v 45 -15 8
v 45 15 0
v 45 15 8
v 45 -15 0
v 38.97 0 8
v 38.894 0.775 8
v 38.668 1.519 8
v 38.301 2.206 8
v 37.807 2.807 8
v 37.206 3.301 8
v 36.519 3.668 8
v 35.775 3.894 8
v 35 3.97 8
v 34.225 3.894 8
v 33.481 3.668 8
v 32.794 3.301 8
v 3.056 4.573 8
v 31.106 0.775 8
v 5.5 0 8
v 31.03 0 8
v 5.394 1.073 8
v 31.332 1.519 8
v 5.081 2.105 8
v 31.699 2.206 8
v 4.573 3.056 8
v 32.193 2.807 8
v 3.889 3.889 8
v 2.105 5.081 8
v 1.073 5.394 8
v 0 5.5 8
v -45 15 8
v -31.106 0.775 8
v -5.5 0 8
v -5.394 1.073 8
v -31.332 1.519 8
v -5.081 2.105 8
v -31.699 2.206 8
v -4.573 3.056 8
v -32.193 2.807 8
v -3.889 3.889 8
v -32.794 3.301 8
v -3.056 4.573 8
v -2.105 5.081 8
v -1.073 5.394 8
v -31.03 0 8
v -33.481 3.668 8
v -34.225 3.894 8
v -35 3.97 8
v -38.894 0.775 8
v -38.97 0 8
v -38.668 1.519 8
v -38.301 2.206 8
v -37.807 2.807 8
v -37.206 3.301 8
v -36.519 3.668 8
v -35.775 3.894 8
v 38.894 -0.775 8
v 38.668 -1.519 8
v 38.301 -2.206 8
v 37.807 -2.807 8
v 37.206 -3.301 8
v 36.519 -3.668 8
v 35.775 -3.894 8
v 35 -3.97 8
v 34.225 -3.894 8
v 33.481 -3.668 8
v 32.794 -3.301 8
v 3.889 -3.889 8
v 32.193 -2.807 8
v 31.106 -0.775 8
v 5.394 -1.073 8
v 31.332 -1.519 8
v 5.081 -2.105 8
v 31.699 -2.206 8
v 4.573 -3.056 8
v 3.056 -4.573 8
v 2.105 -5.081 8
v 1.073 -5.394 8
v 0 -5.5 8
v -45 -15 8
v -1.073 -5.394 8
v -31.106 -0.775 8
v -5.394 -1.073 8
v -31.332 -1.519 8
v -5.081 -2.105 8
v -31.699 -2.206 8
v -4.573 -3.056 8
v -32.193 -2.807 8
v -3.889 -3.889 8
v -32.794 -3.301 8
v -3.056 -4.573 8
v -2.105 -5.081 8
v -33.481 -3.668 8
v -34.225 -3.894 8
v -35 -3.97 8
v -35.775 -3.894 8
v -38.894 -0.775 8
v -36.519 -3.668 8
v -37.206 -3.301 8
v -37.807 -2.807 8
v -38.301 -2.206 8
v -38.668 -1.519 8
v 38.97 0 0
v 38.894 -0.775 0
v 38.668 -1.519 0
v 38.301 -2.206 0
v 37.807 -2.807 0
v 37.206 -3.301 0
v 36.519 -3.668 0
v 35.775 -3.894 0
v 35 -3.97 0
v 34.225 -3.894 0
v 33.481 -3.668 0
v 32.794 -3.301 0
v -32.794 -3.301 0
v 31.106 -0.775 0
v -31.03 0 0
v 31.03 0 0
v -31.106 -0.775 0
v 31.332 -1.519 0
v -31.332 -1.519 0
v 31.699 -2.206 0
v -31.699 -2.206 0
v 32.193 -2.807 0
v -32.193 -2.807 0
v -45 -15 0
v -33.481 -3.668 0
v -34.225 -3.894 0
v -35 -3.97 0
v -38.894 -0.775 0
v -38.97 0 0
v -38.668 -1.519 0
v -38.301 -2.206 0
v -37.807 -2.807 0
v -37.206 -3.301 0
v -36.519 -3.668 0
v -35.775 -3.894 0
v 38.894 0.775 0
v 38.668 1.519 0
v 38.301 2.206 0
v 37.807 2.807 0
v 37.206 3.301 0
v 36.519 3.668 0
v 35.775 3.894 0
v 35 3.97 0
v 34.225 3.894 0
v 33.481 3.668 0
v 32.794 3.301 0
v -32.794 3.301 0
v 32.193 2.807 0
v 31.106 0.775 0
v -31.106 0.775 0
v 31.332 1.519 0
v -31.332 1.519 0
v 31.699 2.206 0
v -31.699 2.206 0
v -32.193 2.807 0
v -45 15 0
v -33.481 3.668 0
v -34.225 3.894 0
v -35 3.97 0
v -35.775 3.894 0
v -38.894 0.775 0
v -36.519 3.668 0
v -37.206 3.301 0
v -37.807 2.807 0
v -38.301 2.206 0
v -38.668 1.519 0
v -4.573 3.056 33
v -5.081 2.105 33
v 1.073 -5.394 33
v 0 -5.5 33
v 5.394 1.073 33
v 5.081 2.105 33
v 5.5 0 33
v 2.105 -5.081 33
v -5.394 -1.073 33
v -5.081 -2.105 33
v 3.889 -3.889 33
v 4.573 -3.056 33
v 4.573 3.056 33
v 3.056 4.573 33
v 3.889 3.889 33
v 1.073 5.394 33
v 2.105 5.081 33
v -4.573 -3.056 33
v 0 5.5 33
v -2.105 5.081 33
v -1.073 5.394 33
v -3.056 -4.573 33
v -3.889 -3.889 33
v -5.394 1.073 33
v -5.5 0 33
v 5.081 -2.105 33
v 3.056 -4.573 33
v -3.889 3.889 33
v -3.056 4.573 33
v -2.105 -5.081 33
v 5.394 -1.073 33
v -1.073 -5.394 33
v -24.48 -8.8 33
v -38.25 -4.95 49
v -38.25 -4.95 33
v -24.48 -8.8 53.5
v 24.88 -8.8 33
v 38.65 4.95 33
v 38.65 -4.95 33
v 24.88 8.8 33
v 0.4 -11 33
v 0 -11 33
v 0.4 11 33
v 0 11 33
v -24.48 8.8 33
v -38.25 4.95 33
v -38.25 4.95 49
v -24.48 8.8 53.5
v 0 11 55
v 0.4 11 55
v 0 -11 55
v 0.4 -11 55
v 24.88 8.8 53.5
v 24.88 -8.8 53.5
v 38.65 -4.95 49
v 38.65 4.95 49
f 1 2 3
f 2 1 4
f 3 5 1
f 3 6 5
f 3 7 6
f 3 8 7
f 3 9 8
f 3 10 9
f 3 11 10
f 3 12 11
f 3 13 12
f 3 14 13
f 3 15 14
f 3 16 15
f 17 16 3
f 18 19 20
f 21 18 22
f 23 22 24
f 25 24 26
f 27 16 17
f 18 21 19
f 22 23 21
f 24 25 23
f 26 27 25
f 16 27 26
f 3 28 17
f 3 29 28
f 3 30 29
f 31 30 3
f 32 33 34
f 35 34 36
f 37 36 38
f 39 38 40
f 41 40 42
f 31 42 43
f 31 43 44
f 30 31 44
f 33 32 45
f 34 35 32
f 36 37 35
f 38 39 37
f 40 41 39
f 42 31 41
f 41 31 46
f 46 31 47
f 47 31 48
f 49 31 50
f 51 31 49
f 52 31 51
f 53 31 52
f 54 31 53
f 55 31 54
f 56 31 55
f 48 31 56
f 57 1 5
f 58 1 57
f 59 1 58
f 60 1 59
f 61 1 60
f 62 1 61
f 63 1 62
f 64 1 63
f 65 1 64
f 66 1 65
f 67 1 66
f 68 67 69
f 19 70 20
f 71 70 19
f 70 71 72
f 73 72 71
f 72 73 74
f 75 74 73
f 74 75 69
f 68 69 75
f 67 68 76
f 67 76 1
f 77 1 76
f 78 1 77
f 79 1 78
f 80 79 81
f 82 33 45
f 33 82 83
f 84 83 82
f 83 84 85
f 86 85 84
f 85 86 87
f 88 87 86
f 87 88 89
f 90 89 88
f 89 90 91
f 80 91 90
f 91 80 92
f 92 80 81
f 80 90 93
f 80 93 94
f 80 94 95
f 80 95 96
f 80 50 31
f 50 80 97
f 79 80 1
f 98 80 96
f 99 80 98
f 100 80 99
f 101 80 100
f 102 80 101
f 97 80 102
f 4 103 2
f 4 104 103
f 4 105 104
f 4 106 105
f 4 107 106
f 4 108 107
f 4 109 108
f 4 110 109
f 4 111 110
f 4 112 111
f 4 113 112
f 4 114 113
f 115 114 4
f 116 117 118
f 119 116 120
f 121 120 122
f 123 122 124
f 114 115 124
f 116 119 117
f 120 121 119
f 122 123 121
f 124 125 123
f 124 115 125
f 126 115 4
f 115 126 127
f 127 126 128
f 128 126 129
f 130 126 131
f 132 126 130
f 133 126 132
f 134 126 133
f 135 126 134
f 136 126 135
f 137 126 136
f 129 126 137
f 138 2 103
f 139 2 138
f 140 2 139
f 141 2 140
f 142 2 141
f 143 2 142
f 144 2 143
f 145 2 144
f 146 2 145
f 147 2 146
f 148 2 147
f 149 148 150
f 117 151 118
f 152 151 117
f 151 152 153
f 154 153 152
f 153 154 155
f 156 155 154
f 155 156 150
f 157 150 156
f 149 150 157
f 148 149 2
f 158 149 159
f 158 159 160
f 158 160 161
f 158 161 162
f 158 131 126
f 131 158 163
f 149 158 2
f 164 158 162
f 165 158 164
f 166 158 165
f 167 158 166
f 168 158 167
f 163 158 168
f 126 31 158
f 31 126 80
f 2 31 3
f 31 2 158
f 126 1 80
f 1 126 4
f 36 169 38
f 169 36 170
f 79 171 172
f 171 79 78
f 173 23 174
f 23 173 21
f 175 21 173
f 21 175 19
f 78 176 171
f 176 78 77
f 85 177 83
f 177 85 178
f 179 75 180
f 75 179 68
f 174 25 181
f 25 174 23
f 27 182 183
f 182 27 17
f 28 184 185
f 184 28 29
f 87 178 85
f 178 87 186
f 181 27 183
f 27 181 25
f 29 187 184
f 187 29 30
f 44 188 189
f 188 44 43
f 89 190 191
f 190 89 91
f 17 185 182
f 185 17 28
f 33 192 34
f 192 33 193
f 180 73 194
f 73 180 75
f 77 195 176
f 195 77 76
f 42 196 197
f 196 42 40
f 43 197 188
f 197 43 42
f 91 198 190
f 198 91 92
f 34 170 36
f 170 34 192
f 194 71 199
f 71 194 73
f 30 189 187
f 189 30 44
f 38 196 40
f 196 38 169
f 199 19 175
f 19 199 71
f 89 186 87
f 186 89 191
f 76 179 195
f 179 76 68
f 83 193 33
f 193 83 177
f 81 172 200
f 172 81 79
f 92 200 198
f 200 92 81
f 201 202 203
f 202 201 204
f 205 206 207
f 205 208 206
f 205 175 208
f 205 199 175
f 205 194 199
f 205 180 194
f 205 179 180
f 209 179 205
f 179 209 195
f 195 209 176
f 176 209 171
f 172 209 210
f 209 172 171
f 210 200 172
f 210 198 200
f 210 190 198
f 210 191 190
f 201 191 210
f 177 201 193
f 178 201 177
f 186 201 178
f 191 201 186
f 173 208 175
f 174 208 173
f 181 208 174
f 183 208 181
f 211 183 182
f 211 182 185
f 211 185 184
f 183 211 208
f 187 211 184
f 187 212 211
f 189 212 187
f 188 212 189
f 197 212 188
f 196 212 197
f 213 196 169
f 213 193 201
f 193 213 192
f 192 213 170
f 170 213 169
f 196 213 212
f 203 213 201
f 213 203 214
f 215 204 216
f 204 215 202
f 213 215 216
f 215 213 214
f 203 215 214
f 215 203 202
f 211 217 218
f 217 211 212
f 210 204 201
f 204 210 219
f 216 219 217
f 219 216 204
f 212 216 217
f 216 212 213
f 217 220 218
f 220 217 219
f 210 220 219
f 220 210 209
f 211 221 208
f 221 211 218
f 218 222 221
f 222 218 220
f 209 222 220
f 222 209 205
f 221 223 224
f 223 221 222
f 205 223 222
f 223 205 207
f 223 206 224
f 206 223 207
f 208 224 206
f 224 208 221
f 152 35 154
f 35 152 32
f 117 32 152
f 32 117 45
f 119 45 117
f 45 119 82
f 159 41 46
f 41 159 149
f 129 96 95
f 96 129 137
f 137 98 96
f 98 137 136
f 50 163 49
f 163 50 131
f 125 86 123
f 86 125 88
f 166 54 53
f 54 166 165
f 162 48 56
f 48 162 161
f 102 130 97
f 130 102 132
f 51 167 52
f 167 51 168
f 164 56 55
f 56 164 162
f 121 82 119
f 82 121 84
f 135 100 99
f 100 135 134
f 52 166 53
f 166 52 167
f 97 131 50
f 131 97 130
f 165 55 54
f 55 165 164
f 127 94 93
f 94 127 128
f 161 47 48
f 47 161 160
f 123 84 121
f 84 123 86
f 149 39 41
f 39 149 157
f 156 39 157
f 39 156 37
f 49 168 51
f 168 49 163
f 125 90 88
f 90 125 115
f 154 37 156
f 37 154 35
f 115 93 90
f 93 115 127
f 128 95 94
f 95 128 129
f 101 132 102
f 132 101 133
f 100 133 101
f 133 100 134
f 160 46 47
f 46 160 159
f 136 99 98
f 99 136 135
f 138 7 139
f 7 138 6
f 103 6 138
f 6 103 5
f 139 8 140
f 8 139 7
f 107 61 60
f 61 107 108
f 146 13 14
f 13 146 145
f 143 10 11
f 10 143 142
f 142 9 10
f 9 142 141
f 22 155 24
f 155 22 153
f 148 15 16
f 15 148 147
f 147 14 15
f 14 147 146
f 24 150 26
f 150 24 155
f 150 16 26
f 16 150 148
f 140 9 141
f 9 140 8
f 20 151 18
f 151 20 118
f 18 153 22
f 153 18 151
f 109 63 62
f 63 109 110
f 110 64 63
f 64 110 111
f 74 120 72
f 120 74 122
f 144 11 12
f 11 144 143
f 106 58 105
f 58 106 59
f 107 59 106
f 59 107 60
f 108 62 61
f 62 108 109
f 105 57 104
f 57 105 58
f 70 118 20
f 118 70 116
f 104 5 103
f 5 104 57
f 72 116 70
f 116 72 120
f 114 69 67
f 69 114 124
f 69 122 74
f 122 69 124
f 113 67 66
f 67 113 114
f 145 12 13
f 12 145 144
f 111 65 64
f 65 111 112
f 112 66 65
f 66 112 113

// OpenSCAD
$fn = 32;

// ----------------------------------------------------------------------
// Boat cleat: 90 mm base, horn 44 mm up
// ----------------------------------------------------------------------

// --- parameters (mm) ---
base_l = 90;              // base length
base_w = 30;              // base width
base_t = 8;               // base thickness
horn_len = 76.5;          // horn length
horn_d = 22;              // horn diameter at the middle
horn_z = 44;              // horn axis height
end_drop = 6;             // how far the horn tips drop
post_d = 11;              // centre post diameter
holes_d = 7.94;           // fixing holes
hole_x = 35;              // fixing hole spacing

difference() {
  union() {
    translate([-45, -15, 0]) cube([base_l, base_w, base_t]);
    /* centre post, sunk 1 mm into the base */
    translate([0, 0, 7]) cylinder(h = 37, d = post_d);
    /* horn: a hull chain of boxes, full in the middle and lighter at the tips */
    hull() {
      translate([-38.25, -4.95, 33]) cube([0.4, 9.9, 16], center = false);
      translate([-24.48, -8.8, 33]) cube([0.4, 17.6, 20.5], center = false);
    }
    hull() {
      translate([-24.48, -8.8, 33]) cube([0.4, 17.6, 20.5], center = false);
      translate([0, -11, 33]) cube([0.4, 22, 22], center = false);
    }
    hull() {
      translate([0, -11, 33]) cube([0.4, 22, 22], center = false);
      translate([24.48, -8.8, 33]) cube([0.4, 17.6, 20.5], center = false);
    }
    hull() {
      translate([24.48, -8.8, 33]) cube([0.4, 17.6, 20.5], center = false);
      translate([38.25, -4.95, 33]) cube([0.4, 9.9, 16], center = false);
    }
  }
  translate([-35, 0, -2.5]) cylinder(h = base_t + 5, d = holes_d);
  translate([35, 0, -2.5]) cylinder(h = base_t + 5, d = holes_d);
}
